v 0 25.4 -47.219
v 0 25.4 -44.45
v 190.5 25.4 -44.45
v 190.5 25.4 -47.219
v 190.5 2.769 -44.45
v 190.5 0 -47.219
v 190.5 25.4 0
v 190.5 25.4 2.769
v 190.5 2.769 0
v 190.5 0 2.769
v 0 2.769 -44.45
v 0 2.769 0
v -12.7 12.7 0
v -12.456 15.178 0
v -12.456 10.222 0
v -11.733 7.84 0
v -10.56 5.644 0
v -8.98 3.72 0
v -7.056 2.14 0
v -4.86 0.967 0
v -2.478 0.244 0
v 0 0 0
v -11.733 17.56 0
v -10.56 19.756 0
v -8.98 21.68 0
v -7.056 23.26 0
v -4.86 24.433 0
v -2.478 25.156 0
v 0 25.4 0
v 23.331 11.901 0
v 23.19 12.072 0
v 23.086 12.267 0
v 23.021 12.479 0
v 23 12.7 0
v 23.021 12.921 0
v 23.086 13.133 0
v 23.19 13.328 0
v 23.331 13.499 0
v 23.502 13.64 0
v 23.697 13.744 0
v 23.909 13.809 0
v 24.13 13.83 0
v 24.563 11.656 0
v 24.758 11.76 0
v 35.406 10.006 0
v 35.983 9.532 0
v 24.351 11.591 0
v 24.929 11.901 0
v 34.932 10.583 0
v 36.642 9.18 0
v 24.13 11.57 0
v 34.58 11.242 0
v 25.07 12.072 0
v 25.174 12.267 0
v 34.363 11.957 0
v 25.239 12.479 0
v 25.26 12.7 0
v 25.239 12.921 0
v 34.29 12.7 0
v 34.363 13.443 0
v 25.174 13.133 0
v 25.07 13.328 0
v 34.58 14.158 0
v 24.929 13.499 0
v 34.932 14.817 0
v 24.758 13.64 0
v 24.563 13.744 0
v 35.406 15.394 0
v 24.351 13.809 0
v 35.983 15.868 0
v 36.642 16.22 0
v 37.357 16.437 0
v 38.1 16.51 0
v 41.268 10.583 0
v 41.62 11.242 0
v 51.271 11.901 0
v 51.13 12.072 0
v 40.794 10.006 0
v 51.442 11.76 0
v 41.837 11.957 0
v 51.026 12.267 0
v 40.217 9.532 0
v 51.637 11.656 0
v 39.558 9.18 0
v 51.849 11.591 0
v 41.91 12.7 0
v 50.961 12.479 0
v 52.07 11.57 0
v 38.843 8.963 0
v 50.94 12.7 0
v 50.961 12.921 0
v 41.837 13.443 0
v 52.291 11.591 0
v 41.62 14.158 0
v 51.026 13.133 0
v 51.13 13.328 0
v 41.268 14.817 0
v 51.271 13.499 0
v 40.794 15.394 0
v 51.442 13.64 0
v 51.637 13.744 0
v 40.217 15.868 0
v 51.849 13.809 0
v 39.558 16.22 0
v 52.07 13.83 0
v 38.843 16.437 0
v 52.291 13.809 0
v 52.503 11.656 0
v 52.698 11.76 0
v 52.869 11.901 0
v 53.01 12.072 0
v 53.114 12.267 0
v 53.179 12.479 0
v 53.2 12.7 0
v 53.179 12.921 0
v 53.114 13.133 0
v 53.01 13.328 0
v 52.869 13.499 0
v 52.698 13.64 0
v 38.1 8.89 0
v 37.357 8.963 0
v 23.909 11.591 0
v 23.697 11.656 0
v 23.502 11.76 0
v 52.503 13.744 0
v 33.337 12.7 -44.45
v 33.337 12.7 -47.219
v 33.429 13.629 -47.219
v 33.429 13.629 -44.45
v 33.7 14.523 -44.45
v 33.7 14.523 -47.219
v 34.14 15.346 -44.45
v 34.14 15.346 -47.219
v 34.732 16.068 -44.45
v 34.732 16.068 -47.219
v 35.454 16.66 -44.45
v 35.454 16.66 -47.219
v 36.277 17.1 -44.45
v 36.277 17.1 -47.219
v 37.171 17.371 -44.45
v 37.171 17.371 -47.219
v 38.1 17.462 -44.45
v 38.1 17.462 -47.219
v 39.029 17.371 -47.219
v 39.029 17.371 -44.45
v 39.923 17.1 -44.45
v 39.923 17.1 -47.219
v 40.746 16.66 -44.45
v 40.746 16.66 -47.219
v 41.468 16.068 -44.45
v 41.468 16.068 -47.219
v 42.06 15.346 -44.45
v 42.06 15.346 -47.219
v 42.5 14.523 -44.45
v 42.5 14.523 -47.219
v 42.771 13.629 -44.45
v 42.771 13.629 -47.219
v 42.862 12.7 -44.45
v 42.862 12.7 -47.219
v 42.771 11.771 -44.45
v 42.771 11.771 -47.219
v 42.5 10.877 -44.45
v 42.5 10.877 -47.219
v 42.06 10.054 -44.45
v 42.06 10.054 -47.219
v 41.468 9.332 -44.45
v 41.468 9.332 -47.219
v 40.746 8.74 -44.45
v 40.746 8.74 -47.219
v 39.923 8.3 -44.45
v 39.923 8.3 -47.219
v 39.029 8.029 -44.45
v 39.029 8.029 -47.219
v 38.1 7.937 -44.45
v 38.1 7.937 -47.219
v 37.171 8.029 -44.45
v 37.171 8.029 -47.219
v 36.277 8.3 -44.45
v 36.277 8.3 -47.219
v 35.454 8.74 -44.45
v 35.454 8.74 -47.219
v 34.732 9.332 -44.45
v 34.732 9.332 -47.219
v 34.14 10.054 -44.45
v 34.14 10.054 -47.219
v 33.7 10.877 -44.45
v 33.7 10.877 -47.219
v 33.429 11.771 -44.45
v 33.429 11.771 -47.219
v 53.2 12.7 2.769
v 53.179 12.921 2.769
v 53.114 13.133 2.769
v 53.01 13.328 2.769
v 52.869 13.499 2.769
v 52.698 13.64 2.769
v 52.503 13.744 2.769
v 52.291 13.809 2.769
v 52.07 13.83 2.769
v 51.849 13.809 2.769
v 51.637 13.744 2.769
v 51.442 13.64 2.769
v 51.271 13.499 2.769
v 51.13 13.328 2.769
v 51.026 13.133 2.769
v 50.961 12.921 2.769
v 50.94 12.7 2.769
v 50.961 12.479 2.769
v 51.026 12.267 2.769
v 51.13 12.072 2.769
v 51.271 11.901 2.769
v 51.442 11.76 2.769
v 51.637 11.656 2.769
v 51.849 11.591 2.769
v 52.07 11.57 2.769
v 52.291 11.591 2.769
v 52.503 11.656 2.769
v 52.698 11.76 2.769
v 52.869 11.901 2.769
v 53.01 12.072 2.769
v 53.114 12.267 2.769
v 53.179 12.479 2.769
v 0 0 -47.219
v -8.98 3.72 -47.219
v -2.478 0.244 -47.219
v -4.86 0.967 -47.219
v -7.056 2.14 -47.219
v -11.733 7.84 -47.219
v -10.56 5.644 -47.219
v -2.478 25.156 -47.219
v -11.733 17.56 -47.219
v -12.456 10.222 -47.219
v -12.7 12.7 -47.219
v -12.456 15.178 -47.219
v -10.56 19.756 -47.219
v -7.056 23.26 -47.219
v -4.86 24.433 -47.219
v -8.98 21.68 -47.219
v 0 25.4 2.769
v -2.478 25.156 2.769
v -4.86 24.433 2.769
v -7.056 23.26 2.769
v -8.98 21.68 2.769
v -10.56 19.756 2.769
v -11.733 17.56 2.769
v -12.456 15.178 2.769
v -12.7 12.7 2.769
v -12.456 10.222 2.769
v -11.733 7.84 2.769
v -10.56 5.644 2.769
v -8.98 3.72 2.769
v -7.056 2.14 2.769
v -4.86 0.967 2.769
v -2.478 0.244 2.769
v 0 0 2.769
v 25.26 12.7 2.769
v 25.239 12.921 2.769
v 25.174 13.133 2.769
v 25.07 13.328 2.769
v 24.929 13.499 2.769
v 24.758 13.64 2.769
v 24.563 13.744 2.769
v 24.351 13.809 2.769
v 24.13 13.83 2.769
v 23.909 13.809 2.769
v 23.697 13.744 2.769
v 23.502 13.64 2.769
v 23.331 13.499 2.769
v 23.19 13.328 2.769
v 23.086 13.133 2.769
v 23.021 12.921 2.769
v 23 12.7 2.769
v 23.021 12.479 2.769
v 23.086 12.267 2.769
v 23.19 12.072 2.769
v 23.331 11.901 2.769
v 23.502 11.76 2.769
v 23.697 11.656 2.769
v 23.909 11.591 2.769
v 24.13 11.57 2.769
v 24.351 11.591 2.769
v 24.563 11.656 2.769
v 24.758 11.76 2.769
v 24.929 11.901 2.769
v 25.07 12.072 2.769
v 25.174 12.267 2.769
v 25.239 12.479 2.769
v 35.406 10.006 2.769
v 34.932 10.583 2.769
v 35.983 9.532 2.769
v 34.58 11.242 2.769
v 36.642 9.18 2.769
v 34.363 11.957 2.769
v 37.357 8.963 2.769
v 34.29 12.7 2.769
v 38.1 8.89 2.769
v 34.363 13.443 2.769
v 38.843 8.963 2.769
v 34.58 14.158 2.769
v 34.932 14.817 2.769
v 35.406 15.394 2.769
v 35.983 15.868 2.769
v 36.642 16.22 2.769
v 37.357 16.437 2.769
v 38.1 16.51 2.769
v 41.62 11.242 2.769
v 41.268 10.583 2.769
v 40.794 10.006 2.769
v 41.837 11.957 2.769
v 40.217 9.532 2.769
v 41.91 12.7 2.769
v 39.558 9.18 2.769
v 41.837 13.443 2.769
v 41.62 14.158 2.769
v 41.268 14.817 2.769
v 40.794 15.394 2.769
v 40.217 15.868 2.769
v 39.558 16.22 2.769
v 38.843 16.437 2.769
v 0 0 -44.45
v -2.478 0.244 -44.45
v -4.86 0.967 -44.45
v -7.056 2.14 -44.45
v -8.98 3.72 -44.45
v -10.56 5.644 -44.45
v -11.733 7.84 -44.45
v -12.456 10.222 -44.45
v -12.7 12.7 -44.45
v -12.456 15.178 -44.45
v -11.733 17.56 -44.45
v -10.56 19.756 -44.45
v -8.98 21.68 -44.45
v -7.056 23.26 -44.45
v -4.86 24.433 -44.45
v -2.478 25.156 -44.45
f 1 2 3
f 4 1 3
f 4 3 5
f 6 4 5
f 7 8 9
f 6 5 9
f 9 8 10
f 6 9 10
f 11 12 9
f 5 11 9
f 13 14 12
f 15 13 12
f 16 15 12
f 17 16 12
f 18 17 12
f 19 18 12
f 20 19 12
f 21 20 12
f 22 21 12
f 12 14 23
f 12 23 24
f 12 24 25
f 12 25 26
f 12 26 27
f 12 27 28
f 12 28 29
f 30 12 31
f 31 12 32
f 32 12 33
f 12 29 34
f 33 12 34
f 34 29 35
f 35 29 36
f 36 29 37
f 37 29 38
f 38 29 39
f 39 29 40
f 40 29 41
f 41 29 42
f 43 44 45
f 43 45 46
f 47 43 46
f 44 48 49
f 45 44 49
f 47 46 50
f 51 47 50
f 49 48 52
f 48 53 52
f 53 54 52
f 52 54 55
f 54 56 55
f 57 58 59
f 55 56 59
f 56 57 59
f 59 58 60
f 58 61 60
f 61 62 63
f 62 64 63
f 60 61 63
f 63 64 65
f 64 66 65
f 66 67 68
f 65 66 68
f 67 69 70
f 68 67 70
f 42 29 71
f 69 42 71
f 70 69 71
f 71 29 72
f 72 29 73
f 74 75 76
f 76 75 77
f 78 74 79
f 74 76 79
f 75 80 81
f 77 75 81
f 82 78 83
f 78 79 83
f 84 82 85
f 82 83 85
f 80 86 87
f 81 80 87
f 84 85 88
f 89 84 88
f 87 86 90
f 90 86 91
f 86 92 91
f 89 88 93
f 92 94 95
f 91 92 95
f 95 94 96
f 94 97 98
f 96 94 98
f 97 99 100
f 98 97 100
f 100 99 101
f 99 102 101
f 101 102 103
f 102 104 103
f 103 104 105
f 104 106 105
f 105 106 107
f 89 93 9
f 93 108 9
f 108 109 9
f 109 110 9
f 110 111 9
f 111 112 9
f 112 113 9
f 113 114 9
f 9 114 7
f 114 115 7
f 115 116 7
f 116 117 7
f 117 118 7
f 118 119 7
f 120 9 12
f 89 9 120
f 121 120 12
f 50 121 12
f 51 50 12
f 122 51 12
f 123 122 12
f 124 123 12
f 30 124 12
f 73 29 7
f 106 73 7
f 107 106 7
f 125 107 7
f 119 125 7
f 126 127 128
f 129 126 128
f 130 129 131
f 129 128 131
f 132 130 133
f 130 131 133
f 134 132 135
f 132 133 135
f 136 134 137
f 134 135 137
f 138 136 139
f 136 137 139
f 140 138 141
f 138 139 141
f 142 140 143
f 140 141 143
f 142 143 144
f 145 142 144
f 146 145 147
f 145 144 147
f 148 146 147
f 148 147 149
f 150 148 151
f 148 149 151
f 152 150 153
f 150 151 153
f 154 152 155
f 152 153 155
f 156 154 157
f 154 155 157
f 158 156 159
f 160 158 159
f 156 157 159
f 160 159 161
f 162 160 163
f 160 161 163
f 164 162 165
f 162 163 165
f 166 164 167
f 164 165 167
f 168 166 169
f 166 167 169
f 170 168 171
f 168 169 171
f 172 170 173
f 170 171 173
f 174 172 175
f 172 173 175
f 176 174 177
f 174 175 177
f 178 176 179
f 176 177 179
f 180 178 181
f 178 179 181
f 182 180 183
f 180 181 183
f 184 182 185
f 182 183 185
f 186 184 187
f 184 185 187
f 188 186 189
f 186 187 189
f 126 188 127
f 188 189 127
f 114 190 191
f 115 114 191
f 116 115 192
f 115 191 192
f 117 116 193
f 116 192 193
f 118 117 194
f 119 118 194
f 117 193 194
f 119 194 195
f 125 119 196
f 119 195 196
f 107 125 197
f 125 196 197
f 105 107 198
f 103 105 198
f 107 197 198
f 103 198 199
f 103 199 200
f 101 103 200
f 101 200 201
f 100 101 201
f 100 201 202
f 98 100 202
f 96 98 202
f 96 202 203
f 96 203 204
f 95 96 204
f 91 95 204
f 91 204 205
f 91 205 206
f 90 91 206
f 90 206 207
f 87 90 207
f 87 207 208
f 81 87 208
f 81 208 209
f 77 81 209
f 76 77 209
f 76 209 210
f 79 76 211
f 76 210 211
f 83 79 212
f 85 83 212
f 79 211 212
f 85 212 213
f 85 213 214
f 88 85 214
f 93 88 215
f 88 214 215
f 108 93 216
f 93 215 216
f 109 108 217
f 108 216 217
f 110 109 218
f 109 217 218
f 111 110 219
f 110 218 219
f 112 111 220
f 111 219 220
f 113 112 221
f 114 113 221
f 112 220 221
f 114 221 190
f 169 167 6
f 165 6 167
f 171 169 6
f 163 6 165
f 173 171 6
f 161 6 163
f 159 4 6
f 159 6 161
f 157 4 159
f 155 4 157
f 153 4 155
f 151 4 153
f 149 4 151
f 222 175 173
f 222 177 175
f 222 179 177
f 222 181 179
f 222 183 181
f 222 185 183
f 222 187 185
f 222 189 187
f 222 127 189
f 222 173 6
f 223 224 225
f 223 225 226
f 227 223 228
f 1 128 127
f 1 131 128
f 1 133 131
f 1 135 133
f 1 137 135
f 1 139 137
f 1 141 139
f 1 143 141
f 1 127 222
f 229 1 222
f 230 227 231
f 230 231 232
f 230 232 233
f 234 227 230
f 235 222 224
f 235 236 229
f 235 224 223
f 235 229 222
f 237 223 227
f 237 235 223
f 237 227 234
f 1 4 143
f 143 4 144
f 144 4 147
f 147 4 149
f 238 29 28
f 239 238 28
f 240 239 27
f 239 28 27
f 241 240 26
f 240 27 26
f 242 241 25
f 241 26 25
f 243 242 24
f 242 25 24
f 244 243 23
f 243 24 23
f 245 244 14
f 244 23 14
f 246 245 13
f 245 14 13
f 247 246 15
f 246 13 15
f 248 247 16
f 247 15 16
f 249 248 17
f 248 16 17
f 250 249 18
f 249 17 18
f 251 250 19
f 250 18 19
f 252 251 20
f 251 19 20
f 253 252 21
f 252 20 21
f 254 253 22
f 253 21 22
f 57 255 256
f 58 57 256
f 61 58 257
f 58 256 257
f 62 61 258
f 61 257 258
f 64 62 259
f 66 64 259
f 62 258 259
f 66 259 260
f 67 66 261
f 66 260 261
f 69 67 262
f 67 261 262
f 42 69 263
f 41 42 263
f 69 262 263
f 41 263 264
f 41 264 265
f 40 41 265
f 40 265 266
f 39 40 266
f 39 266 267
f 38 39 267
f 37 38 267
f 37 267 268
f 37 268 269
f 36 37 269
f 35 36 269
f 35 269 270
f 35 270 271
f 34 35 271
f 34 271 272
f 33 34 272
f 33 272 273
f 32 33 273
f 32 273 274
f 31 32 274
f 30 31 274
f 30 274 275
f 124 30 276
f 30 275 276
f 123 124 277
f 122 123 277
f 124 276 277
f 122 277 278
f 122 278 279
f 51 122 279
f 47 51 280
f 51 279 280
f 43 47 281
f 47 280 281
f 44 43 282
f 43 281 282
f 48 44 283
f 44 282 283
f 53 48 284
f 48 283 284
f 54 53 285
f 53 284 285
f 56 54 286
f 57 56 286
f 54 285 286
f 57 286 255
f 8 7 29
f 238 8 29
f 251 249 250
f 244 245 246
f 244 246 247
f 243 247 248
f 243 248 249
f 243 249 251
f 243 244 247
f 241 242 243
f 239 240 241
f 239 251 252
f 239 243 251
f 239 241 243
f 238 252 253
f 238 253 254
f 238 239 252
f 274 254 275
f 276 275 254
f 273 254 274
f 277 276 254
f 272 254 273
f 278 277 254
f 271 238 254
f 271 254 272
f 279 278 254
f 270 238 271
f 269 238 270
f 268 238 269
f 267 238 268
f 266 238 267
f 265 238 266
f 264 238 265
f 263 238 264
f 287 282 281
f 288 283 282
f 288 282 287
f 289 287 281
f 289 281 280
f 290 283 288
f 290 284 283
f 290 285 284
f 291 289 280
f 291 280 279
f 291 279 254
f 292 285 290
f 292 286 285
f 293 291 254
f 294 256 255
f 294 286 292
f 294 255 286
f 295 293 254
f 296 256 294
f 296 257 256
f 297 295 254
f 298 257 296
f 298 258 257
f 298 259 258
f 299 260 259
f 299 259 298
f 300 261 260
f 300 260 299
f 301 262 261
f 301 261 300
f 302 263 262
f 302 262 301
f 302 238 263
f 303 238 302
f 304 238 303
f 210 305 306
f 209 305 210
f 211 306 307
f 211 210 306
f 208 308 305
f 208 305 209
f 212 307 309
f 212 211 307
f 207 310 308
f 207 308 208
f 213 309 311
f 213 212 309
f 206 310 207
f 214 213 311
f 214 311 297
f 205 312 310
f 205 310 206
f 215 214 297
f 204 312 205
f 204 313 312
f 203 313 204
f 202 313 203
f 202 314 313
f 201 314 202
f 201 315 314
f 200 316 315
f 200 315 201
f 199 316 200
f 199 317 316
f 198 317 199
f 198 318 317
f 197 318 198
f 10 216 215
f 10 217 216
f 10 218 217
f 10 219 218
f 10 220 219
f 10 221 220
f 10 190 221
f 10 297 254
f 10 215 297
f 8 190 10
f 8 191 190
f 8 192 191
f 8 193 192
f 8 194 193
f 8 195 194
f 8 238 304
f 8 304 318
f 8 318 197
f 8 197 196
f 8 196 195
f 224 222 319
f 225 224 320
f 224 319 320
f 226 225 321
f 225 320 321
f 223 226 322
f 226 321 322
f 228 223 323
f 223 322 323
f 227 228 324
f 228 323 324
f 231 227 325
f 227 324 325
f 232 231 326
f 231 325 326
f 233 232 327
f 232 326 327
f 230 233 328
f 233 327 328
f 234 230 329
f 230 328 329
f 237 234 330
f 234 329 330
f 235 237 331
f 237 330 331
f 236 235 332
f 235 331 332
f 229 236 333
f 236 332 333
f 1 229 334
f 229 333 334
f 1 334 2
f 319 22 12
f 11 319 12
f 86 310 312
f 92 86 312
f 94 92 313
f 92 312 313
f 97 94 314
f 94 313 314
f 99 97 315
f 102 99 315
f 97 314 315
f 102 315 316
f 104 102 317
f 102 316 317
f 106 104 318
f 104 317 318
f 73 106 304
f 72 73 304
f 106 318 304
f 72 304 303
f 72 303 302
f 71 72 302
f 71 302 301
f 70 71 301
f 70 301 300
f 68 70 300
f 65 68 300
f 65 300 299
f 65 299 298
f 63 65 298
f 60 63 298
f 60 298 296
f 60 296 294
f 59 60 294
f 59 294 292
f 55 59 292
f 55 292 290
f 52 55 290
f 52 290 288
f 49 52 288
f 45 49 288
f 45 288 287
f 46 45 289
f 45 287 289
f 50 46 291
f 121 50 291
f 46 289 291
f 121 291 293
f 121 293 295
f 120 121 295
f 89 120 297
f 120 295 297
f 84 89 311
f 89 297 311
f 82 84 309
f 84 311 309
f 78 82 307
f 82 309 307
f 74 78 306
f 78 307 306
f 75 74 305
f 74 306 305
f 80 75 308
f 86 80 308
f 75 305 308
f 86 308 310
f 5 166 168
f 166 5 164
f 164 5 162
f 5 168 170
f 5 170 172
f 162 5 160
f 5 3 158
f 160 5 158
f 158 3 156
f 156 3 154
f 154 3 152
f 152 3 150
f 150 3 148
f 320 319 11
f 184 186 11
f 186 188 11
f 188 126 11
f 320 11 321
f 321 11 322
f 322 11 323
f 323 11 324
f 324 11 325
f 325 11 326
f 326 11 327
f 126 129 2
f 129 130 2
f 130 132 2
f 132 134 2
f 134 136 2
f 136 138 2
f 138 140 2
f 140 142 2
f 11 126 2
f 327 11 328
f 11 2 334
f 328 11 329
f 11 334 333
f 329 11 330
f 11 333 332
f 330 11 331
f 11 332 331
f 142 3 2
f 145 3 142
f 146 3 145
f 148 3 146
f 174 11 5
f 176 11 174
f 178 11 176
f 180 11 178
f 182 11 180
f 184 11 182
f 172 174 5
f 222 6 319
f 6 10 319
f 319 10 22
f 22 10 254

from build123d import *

# Parameters (mm, degrees)
BOSS_EXTRUDE1_DEPTH = 2.7686
SKETCH3_R           = 3.81
SKETCH3_R_2         = 1.1303
CUT_EXTRUDE1_DEPTH  = 3.7686
BOSS_EXTRUDE2_START = -2.7686
SKETCH5_W           = 190.5
SKETCH5_H           = 2.7686
BOSS_EXTRUDE2_DEPTH = 44.45
BOSS_EXTRUDE3_DEPTH = 2.7686
SKETCH7_R           = 4.7625
CUT_EXTRUDE2_DEPTH  = 2.7686


with BuildPart() as part:
    # Sketch1 → Boss-Extrude1 (new body)
    with BuildSketch(Plane.XY):
        with BuildLine():
            Line((0, 0), (190.499997766, 0))
            Line((190.499997766, 0), (190.499997766, 25.4))
            Line((190.499997766, 25.4), (-4.468e-06, 25.4))
            ThreePointArc((-4.468e-06, 25.4), (-12.700002234, 12.699997766), (0, 0))
        make_face()
    extrude(amount=BOSS_EXTRUDE1_DEPTH)

    # Sketch3 → Cut-Extrude1 (cut, through all)
    with BuildSketch(Plane.XY.offset(2.7686)):
        with Locations((38.099997766, 12.7)):
            Circle(SKETCH3_R)
        with Locations((24.129997766, 12.7)):
            Circle(SKETCH3_R_2)
        with Locations((52.069997766, 12.7)):
            Circle(SKETCH3_R_2)
    extrude(amount=-CUT_EXTRUDE1_DEPTH, mode=Mode.SUBTRACT)

    # Sketch5 → Boss-Extrude2 (add)
    with BuildSketch(Plane.XY.offset(2.7686).offset(BOSS_EXTRUDE2_START)):
        with Locations((95.249997766, 1.3843)):
            Rectangle(SKETCH5_W, SKETCH5_H)
    extrude(amount=-BOSS_EXTRUDE2_DEPTH)

    # Sketch6 → Boss-Extrude3 (add)
    with BuildSketch(Plane(origin=(0, 0, -44.45), x_dir=(-1, 0, 0), z_dir=(0, 0, -1))):
        with BuildLine():
            Line((4.468e-06, 25.4), (-190.499997766, 25.4))
            Line((-190.499997766, 25.4), (-190.499997766, 12.7))
            Line((-190.499997766, 12.7), (-190.499997766, 0))
            Line((-190.499997766, 0), (0, 0))
            ThreePointArc((0, 0), (12.700002234, 12.699997766), (4.468e-06, 25.4))
        make_face()
    extrude(amount=BOSS_EXTRUDE3_DEPTH)

    # Sketch7 → Cut-Extrude2 (cut)
    with BuildSketch(Plane(origin=(0, 0, -47.2186), x_dir=(-1, 0, 0), z_dir=(0, 0, -1))):
        with Locations((-38.099997766, 12.7)):
            Circle(SKETCH7_R)
    extrude(amount=-CUT_EXTRUDE2_DEPTH, mode=Mode.SUBTRACT)


solid = part.part
